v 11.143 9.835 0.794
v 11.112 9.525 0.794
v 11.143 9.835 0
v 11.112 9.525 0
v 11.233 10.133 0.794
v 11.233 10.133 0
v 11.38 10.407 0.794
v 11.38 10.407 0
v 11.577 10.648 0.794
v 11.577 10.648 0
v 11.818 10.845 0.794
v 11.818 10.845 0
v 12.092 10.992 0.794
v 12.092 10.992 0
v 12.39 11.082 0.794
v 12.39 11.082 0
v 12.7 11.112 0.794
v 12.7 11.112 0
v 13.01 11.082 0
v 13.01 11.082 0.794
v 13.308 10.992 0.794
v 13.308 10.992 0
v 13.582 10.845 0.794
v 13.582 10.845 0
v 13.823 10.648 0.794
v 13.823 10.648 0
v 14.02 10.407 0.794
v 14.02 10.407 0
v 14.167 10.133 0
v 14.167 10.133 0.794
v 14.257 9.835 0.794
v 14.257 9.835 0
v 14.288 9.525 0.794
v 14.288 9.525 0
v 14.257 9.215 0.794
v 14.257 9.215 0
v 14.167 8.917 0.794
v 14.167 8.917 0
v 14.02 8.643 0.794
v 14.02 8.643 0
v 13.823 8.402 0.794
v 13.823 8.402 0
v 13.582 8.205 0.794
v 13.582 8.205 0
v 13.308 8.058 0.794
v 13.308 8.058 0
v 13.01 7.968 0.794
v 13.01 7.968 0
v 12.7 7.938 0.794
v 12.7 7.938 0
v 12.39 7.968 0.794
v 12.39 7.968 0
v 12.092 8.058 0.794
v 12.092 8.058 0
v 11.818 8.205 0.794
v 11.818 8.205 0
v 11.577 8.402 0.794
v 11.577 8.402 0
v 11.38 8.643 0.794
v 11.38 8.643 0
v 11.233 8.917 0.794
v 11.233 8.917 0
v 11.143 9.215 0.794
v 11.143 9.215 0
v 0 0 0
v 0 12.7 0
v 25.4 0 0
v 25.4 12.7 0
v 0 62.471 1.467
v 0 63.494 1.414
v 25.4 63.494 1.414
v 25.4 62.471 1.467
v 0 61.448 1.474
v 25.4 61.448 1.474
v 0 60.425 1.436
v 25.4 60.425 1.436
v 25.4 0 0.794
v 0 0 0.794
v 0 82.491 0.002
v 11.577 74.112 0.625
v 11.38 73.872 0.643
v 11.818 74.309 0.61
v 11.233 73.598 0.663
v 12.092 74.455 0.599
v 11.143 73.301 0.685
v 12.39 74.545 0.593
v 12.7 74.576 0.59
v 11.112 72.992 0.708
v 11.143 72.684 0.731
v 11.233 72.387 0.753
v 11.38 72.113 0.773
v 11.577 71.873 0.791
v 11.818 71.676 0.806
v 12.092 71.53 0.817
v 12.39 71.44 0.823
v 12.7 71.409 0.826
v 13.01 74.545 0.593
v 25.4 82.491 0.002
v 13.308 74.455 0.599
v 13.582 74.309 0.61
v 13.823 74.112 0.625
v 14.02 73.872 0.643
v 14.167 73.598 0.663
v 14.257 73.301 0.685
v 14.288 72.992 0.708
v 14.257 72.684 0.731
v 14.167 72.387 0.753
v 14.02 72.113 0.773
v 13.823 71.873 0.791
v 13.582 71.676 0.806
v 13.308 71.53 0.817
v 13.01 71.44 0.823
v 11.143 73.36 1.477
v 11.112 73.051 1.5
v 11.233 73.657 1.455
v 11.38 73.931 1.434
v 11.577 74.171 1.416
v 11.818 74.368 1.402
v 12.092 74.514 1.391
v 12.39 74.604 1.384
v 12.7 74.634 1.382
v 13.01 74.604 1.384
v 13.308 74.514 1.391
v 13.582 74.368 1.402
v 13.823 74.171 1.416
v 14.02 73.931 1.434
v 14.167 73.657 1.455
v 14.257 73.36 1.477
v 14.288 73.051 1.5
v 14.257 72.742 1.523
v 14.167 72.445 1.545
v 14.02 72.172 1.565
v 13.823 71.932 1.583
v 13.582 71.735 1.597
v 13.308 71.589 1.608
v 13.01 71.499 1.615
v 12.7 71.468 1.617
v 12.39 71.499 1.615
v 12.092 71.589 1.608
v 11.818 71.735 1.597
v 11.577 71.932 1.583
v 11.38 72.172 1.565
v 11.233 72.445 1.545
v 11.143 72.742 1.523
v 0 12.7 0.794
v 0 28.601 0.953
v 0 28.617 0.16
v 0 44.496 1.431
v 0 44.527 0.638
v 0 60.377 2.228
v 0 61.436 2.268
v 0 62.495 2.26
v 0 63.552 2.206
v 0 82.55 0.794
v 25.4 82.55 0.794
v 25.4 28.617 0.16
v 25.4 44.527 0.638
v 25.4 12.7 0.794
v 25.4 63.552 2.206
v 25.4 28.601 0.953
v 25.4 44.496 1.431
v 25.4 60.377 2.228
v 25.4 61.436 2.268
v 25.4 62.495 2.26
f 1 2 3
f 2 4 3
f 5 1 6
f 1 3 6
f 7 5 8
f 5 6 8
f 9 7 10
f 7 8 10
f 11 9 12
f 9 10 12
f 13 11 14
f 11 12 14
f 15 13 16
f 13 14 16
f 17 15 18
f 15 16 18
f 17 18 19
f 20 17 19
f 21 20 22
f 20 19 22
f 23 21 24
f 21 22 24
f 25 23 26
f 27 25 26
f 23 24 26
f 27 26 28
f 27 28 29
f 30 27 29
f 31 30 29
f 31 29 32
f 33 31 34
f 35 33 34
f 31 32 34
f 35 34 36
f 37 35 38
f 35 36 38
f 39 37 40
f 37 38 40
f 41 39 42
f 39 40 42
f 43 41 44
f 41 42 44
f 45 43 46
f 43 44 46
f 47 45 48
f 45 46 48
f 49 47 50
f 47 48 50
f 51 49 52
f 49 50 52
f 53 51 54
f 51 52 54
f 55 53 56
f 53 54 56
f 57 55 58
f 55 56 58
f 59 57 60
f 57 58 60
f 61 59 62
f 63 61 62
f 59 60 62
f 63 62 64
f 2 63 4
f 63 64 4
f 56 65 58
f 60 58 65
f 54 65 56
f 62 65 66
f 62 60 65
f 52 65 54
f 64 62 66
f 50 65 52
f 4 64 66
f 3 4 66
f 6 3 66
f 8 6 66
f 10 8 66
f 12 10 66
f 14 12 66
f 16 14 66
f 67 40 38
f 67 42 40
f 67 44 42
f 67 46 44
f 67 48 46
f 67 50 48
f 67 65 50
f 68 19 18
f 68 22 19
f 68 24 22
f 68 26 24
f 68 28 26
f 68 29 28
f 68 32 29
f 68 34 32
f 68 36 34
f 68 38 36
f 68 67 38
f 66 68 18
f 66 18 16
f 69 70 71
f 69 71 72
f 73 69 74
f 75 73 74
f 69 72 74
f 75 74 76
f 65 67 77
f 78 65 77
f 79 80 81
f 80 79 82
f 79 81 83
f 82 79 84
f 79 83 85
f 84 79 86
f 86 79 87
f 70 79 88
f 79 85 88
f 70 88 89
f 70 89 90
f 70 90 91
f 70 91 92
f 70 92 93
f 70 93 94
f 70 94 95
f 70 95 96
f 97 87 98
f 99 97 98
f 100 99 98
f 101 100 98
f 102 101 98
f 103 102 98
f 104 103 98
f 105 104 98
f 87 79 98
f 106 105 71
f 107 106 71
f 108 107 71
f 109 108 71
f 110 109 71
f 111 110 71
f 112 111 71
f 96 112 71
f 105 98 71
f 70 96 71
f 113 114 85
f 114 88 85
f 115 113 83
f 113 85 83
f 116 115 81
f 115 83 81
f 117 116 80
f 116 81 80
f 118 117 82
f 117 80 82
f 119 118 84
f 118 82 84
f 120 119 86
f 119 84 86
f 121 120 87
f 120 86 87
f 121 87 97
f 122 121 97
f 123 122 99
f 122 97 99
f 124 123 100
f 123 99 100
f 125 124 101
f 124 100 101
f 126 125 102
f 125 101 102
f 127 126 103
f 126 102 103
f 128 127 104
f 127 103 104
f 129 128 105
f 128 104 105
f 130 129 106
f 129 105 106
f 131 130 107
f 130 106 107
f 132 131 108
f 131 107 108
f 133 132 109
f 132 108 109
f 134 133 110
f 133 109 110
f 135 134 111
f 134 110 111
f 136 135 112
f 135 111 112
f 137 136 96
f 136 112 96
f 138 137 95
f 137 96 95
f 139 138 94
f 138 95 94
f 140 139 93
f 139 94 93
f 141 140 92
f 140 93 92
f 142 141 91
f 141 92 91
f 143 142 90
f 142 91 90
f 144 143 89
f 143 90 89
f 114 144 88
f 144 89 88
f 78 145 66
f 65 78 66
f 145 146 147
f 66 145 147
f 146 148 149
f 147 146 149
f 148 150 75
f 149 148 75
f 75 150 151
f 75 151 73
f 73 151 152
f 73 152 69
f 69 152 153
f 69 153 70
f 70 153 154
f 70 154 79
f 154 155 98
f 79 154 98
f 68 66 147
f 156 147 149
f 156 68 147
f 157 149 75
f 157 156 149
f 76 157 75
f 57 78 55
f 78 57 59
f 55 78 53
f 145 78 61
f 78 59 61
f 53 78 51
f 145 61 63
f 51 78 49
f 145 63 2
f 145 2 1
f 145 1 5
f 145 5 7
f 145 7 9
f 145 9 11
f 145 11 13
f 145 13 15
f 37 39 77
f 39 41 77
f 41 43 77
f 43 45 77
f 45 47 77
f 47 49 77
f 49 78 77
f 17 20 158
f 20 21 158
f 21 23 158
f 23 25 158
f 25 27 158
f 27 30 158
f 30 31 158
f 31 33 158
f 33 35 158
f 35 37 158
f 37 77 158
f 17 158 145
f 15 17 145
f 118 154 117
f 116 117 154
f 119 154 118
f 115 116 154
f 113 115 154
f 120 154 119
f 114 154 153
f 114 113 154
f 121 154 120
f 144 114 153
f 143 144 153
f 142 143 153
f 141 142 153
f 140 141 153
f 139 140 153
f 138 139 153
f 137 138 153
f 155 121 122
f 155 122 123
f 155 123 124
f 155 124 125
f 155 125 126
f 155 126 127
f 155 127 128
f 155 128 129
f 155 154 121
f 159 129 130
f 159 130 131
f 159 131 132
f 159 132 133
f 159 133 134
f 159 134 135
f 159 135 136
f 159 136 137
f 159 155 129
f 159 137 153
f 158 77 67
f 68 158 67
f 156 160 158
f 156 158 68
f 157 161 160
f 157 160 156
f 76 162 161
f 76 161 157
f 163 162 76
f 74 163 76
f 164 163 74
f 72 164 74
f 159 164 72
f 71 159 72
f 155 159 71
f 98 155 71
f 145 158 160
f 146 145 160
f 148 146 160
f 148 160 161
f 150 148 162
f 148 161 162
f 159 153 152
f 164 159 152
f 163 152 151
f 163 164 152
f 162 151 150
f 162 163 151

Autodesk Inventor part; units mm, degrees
ref_plane "YZ Plane" through (0, 0, 0) normal (1, 0, 0) x (0, 1, 0)
ref_plane "XZ Plane" through (0, 0, 0) normal (0, 1, 0) x (-1, 0, 0)
sketch "Sketch1" plane through (0, 0, 0) normal (0, 0, 1) x (1, 0, 0)
  line L0 (0, 0) -> (25.4, 0)
  line L1 (25.4, 0) -> (25.4, 82.55)
  line L2 (25.4, 82.55) -> (0, 82.55)
  line L3 (0, 82.55) -> (0, 0)
  line L4 (12.7, 82.55) -> (12.7, 0) construction
  circle A0 centre (12.7, 73.025) radius 1.5875
  circle A1 centre (12.7, 9.525) radius 1.5875
  dimension "d0" = 25.4
  dimension "d1" = 82.55
  dimension "d2" = 3.175
  dimension "d3" = 9.525
  dimension "d4" = 9.525
extrude "Extrusion1" add sketch "Sketch1" along normal blind 0.7937
ref_plane "Work Plane1" through (12.7, 0, 0) normal (1, 0, 0) x (0, 0, -1)
sketch "Sketch2" plane through (25.4, 0, 0) normal (1, 0, 0) x (0, 0, -1)
  line L0 (0, 0) -> (0, 82.55) projected
  line L1 (0, 82.55) -> (-0.7937, 82.55) projected
  line L2 (-0.7937, 0) -> (-0.7937, 82.55) projected
  line L3 (0, 0) -> (-0.7937, 0) projected
  line L4 (1.093, 107.9388) -> (-6.4365, 6.6182) construction
  line L5 (1.093, 107.9388) -> (127.7437, 98.527) construction
  line L6 (-0.7937, 82.55) -> (-2.2055, 63.5524)
  arc A0 (-2.2055, 63.5524) -> (-2.2278, 60.3774) centre (21.3863, 61.7992) ccw
  line L7 (-0.7937, 0) -> (-0.7937, 12.7)
  arc A1 (-0.7937, 12.7) -> (-2.2278, 60.3774) centre (-794.0664, 12.7) ccw
  line L8 (-0.7937, 82.55) -> (-0.0022, 82.4912)
  line L9 (-0.0022, 82.4912) -> (-1.4139, 63.4936)
  line L10 (-0.7937, 12.7) -> (0, 12.7) construction
  line L11 (-0.7937, 0) -> (0, 0)
  line L12 (0, 12.7) -> (0, 0)
  arc A2 (0, 12.7) -> (-1.4355, 60.4251) centre (-794.0664, 12.7) ccw
  arc A3 (-1.4139, 63.4936) -> (-1.4355, 60.4251) centre (21.3863, 61.7992) ccw
  dimension "d7" = 85.75
  dimension "d8" = 19.05
  dimension "d9" = 12.7
  dimension "d12" = 0.7937
  dimension "d15" = 101.6
  dimension "d16" = 127
  dimension "d17" = 25.4
  dimension "d30" = 3.175
extrude "Extrusion2" cut sketch "Sketch2" against normal blind 25.4 contours L3 L2 A2 L0 | A2 L2 L9 L8 L1 L0 | L8 L9 L2
extrude "Extrusion3" add sketch "Sketch2" against normal blind 25.4 contours L3 L2 A2 L0 | L2 A1 A0 L6 L9 A3 A2 | L8 L9 L2
sketch "Sketch3" plane through (25.4, 63.4936, 1.4139) normal (0, -0.0741085, -0.9972502) x (-1, 0, 0)
  line L0 (0, 0) -> (25.4, 0) projected
  line L1 (0, 19.05) -> (25.4, 19.05) projected
  line L2 (12.7, 19.05) -> (12.7, 0) construction
  circle A0 centre (12.7, 9.525) radius 1.5875
  point P0 (25.4, -63.2142)
  dimension "d22" = 3.175
  dimension "d23" = 9.525
extrude "Extrusion4" cut sketch "Sketch3" against normal through all
sketch "Sketch4" plane through (25.4, 0, 0) normal (0, 0, -1) x (-1, 0, 0)
  line L0 (0, 0) -> (25.4, 0) projected
  line L1 (0, 12.7) -> (25.4, 12.7) projected
  line L2 (12.7, 12.7) -> (12.7, 0) construction
  circle A0 centre (12.7, 9.525) radius 1.5875
  dimension "d26" = 3.175
  dimension "d27" = 9.525
extrude "Extrusion5" cut sketch "Sketch4" against normal through all
equation "\"d4\" = d3"
equation "\"d12\" = d11"
equation "\"d11\" = 0.79375"
properties part number "Hopper to Pail Polycarbonate Flap Connector V2" material "Polycarbonate, Clear"
